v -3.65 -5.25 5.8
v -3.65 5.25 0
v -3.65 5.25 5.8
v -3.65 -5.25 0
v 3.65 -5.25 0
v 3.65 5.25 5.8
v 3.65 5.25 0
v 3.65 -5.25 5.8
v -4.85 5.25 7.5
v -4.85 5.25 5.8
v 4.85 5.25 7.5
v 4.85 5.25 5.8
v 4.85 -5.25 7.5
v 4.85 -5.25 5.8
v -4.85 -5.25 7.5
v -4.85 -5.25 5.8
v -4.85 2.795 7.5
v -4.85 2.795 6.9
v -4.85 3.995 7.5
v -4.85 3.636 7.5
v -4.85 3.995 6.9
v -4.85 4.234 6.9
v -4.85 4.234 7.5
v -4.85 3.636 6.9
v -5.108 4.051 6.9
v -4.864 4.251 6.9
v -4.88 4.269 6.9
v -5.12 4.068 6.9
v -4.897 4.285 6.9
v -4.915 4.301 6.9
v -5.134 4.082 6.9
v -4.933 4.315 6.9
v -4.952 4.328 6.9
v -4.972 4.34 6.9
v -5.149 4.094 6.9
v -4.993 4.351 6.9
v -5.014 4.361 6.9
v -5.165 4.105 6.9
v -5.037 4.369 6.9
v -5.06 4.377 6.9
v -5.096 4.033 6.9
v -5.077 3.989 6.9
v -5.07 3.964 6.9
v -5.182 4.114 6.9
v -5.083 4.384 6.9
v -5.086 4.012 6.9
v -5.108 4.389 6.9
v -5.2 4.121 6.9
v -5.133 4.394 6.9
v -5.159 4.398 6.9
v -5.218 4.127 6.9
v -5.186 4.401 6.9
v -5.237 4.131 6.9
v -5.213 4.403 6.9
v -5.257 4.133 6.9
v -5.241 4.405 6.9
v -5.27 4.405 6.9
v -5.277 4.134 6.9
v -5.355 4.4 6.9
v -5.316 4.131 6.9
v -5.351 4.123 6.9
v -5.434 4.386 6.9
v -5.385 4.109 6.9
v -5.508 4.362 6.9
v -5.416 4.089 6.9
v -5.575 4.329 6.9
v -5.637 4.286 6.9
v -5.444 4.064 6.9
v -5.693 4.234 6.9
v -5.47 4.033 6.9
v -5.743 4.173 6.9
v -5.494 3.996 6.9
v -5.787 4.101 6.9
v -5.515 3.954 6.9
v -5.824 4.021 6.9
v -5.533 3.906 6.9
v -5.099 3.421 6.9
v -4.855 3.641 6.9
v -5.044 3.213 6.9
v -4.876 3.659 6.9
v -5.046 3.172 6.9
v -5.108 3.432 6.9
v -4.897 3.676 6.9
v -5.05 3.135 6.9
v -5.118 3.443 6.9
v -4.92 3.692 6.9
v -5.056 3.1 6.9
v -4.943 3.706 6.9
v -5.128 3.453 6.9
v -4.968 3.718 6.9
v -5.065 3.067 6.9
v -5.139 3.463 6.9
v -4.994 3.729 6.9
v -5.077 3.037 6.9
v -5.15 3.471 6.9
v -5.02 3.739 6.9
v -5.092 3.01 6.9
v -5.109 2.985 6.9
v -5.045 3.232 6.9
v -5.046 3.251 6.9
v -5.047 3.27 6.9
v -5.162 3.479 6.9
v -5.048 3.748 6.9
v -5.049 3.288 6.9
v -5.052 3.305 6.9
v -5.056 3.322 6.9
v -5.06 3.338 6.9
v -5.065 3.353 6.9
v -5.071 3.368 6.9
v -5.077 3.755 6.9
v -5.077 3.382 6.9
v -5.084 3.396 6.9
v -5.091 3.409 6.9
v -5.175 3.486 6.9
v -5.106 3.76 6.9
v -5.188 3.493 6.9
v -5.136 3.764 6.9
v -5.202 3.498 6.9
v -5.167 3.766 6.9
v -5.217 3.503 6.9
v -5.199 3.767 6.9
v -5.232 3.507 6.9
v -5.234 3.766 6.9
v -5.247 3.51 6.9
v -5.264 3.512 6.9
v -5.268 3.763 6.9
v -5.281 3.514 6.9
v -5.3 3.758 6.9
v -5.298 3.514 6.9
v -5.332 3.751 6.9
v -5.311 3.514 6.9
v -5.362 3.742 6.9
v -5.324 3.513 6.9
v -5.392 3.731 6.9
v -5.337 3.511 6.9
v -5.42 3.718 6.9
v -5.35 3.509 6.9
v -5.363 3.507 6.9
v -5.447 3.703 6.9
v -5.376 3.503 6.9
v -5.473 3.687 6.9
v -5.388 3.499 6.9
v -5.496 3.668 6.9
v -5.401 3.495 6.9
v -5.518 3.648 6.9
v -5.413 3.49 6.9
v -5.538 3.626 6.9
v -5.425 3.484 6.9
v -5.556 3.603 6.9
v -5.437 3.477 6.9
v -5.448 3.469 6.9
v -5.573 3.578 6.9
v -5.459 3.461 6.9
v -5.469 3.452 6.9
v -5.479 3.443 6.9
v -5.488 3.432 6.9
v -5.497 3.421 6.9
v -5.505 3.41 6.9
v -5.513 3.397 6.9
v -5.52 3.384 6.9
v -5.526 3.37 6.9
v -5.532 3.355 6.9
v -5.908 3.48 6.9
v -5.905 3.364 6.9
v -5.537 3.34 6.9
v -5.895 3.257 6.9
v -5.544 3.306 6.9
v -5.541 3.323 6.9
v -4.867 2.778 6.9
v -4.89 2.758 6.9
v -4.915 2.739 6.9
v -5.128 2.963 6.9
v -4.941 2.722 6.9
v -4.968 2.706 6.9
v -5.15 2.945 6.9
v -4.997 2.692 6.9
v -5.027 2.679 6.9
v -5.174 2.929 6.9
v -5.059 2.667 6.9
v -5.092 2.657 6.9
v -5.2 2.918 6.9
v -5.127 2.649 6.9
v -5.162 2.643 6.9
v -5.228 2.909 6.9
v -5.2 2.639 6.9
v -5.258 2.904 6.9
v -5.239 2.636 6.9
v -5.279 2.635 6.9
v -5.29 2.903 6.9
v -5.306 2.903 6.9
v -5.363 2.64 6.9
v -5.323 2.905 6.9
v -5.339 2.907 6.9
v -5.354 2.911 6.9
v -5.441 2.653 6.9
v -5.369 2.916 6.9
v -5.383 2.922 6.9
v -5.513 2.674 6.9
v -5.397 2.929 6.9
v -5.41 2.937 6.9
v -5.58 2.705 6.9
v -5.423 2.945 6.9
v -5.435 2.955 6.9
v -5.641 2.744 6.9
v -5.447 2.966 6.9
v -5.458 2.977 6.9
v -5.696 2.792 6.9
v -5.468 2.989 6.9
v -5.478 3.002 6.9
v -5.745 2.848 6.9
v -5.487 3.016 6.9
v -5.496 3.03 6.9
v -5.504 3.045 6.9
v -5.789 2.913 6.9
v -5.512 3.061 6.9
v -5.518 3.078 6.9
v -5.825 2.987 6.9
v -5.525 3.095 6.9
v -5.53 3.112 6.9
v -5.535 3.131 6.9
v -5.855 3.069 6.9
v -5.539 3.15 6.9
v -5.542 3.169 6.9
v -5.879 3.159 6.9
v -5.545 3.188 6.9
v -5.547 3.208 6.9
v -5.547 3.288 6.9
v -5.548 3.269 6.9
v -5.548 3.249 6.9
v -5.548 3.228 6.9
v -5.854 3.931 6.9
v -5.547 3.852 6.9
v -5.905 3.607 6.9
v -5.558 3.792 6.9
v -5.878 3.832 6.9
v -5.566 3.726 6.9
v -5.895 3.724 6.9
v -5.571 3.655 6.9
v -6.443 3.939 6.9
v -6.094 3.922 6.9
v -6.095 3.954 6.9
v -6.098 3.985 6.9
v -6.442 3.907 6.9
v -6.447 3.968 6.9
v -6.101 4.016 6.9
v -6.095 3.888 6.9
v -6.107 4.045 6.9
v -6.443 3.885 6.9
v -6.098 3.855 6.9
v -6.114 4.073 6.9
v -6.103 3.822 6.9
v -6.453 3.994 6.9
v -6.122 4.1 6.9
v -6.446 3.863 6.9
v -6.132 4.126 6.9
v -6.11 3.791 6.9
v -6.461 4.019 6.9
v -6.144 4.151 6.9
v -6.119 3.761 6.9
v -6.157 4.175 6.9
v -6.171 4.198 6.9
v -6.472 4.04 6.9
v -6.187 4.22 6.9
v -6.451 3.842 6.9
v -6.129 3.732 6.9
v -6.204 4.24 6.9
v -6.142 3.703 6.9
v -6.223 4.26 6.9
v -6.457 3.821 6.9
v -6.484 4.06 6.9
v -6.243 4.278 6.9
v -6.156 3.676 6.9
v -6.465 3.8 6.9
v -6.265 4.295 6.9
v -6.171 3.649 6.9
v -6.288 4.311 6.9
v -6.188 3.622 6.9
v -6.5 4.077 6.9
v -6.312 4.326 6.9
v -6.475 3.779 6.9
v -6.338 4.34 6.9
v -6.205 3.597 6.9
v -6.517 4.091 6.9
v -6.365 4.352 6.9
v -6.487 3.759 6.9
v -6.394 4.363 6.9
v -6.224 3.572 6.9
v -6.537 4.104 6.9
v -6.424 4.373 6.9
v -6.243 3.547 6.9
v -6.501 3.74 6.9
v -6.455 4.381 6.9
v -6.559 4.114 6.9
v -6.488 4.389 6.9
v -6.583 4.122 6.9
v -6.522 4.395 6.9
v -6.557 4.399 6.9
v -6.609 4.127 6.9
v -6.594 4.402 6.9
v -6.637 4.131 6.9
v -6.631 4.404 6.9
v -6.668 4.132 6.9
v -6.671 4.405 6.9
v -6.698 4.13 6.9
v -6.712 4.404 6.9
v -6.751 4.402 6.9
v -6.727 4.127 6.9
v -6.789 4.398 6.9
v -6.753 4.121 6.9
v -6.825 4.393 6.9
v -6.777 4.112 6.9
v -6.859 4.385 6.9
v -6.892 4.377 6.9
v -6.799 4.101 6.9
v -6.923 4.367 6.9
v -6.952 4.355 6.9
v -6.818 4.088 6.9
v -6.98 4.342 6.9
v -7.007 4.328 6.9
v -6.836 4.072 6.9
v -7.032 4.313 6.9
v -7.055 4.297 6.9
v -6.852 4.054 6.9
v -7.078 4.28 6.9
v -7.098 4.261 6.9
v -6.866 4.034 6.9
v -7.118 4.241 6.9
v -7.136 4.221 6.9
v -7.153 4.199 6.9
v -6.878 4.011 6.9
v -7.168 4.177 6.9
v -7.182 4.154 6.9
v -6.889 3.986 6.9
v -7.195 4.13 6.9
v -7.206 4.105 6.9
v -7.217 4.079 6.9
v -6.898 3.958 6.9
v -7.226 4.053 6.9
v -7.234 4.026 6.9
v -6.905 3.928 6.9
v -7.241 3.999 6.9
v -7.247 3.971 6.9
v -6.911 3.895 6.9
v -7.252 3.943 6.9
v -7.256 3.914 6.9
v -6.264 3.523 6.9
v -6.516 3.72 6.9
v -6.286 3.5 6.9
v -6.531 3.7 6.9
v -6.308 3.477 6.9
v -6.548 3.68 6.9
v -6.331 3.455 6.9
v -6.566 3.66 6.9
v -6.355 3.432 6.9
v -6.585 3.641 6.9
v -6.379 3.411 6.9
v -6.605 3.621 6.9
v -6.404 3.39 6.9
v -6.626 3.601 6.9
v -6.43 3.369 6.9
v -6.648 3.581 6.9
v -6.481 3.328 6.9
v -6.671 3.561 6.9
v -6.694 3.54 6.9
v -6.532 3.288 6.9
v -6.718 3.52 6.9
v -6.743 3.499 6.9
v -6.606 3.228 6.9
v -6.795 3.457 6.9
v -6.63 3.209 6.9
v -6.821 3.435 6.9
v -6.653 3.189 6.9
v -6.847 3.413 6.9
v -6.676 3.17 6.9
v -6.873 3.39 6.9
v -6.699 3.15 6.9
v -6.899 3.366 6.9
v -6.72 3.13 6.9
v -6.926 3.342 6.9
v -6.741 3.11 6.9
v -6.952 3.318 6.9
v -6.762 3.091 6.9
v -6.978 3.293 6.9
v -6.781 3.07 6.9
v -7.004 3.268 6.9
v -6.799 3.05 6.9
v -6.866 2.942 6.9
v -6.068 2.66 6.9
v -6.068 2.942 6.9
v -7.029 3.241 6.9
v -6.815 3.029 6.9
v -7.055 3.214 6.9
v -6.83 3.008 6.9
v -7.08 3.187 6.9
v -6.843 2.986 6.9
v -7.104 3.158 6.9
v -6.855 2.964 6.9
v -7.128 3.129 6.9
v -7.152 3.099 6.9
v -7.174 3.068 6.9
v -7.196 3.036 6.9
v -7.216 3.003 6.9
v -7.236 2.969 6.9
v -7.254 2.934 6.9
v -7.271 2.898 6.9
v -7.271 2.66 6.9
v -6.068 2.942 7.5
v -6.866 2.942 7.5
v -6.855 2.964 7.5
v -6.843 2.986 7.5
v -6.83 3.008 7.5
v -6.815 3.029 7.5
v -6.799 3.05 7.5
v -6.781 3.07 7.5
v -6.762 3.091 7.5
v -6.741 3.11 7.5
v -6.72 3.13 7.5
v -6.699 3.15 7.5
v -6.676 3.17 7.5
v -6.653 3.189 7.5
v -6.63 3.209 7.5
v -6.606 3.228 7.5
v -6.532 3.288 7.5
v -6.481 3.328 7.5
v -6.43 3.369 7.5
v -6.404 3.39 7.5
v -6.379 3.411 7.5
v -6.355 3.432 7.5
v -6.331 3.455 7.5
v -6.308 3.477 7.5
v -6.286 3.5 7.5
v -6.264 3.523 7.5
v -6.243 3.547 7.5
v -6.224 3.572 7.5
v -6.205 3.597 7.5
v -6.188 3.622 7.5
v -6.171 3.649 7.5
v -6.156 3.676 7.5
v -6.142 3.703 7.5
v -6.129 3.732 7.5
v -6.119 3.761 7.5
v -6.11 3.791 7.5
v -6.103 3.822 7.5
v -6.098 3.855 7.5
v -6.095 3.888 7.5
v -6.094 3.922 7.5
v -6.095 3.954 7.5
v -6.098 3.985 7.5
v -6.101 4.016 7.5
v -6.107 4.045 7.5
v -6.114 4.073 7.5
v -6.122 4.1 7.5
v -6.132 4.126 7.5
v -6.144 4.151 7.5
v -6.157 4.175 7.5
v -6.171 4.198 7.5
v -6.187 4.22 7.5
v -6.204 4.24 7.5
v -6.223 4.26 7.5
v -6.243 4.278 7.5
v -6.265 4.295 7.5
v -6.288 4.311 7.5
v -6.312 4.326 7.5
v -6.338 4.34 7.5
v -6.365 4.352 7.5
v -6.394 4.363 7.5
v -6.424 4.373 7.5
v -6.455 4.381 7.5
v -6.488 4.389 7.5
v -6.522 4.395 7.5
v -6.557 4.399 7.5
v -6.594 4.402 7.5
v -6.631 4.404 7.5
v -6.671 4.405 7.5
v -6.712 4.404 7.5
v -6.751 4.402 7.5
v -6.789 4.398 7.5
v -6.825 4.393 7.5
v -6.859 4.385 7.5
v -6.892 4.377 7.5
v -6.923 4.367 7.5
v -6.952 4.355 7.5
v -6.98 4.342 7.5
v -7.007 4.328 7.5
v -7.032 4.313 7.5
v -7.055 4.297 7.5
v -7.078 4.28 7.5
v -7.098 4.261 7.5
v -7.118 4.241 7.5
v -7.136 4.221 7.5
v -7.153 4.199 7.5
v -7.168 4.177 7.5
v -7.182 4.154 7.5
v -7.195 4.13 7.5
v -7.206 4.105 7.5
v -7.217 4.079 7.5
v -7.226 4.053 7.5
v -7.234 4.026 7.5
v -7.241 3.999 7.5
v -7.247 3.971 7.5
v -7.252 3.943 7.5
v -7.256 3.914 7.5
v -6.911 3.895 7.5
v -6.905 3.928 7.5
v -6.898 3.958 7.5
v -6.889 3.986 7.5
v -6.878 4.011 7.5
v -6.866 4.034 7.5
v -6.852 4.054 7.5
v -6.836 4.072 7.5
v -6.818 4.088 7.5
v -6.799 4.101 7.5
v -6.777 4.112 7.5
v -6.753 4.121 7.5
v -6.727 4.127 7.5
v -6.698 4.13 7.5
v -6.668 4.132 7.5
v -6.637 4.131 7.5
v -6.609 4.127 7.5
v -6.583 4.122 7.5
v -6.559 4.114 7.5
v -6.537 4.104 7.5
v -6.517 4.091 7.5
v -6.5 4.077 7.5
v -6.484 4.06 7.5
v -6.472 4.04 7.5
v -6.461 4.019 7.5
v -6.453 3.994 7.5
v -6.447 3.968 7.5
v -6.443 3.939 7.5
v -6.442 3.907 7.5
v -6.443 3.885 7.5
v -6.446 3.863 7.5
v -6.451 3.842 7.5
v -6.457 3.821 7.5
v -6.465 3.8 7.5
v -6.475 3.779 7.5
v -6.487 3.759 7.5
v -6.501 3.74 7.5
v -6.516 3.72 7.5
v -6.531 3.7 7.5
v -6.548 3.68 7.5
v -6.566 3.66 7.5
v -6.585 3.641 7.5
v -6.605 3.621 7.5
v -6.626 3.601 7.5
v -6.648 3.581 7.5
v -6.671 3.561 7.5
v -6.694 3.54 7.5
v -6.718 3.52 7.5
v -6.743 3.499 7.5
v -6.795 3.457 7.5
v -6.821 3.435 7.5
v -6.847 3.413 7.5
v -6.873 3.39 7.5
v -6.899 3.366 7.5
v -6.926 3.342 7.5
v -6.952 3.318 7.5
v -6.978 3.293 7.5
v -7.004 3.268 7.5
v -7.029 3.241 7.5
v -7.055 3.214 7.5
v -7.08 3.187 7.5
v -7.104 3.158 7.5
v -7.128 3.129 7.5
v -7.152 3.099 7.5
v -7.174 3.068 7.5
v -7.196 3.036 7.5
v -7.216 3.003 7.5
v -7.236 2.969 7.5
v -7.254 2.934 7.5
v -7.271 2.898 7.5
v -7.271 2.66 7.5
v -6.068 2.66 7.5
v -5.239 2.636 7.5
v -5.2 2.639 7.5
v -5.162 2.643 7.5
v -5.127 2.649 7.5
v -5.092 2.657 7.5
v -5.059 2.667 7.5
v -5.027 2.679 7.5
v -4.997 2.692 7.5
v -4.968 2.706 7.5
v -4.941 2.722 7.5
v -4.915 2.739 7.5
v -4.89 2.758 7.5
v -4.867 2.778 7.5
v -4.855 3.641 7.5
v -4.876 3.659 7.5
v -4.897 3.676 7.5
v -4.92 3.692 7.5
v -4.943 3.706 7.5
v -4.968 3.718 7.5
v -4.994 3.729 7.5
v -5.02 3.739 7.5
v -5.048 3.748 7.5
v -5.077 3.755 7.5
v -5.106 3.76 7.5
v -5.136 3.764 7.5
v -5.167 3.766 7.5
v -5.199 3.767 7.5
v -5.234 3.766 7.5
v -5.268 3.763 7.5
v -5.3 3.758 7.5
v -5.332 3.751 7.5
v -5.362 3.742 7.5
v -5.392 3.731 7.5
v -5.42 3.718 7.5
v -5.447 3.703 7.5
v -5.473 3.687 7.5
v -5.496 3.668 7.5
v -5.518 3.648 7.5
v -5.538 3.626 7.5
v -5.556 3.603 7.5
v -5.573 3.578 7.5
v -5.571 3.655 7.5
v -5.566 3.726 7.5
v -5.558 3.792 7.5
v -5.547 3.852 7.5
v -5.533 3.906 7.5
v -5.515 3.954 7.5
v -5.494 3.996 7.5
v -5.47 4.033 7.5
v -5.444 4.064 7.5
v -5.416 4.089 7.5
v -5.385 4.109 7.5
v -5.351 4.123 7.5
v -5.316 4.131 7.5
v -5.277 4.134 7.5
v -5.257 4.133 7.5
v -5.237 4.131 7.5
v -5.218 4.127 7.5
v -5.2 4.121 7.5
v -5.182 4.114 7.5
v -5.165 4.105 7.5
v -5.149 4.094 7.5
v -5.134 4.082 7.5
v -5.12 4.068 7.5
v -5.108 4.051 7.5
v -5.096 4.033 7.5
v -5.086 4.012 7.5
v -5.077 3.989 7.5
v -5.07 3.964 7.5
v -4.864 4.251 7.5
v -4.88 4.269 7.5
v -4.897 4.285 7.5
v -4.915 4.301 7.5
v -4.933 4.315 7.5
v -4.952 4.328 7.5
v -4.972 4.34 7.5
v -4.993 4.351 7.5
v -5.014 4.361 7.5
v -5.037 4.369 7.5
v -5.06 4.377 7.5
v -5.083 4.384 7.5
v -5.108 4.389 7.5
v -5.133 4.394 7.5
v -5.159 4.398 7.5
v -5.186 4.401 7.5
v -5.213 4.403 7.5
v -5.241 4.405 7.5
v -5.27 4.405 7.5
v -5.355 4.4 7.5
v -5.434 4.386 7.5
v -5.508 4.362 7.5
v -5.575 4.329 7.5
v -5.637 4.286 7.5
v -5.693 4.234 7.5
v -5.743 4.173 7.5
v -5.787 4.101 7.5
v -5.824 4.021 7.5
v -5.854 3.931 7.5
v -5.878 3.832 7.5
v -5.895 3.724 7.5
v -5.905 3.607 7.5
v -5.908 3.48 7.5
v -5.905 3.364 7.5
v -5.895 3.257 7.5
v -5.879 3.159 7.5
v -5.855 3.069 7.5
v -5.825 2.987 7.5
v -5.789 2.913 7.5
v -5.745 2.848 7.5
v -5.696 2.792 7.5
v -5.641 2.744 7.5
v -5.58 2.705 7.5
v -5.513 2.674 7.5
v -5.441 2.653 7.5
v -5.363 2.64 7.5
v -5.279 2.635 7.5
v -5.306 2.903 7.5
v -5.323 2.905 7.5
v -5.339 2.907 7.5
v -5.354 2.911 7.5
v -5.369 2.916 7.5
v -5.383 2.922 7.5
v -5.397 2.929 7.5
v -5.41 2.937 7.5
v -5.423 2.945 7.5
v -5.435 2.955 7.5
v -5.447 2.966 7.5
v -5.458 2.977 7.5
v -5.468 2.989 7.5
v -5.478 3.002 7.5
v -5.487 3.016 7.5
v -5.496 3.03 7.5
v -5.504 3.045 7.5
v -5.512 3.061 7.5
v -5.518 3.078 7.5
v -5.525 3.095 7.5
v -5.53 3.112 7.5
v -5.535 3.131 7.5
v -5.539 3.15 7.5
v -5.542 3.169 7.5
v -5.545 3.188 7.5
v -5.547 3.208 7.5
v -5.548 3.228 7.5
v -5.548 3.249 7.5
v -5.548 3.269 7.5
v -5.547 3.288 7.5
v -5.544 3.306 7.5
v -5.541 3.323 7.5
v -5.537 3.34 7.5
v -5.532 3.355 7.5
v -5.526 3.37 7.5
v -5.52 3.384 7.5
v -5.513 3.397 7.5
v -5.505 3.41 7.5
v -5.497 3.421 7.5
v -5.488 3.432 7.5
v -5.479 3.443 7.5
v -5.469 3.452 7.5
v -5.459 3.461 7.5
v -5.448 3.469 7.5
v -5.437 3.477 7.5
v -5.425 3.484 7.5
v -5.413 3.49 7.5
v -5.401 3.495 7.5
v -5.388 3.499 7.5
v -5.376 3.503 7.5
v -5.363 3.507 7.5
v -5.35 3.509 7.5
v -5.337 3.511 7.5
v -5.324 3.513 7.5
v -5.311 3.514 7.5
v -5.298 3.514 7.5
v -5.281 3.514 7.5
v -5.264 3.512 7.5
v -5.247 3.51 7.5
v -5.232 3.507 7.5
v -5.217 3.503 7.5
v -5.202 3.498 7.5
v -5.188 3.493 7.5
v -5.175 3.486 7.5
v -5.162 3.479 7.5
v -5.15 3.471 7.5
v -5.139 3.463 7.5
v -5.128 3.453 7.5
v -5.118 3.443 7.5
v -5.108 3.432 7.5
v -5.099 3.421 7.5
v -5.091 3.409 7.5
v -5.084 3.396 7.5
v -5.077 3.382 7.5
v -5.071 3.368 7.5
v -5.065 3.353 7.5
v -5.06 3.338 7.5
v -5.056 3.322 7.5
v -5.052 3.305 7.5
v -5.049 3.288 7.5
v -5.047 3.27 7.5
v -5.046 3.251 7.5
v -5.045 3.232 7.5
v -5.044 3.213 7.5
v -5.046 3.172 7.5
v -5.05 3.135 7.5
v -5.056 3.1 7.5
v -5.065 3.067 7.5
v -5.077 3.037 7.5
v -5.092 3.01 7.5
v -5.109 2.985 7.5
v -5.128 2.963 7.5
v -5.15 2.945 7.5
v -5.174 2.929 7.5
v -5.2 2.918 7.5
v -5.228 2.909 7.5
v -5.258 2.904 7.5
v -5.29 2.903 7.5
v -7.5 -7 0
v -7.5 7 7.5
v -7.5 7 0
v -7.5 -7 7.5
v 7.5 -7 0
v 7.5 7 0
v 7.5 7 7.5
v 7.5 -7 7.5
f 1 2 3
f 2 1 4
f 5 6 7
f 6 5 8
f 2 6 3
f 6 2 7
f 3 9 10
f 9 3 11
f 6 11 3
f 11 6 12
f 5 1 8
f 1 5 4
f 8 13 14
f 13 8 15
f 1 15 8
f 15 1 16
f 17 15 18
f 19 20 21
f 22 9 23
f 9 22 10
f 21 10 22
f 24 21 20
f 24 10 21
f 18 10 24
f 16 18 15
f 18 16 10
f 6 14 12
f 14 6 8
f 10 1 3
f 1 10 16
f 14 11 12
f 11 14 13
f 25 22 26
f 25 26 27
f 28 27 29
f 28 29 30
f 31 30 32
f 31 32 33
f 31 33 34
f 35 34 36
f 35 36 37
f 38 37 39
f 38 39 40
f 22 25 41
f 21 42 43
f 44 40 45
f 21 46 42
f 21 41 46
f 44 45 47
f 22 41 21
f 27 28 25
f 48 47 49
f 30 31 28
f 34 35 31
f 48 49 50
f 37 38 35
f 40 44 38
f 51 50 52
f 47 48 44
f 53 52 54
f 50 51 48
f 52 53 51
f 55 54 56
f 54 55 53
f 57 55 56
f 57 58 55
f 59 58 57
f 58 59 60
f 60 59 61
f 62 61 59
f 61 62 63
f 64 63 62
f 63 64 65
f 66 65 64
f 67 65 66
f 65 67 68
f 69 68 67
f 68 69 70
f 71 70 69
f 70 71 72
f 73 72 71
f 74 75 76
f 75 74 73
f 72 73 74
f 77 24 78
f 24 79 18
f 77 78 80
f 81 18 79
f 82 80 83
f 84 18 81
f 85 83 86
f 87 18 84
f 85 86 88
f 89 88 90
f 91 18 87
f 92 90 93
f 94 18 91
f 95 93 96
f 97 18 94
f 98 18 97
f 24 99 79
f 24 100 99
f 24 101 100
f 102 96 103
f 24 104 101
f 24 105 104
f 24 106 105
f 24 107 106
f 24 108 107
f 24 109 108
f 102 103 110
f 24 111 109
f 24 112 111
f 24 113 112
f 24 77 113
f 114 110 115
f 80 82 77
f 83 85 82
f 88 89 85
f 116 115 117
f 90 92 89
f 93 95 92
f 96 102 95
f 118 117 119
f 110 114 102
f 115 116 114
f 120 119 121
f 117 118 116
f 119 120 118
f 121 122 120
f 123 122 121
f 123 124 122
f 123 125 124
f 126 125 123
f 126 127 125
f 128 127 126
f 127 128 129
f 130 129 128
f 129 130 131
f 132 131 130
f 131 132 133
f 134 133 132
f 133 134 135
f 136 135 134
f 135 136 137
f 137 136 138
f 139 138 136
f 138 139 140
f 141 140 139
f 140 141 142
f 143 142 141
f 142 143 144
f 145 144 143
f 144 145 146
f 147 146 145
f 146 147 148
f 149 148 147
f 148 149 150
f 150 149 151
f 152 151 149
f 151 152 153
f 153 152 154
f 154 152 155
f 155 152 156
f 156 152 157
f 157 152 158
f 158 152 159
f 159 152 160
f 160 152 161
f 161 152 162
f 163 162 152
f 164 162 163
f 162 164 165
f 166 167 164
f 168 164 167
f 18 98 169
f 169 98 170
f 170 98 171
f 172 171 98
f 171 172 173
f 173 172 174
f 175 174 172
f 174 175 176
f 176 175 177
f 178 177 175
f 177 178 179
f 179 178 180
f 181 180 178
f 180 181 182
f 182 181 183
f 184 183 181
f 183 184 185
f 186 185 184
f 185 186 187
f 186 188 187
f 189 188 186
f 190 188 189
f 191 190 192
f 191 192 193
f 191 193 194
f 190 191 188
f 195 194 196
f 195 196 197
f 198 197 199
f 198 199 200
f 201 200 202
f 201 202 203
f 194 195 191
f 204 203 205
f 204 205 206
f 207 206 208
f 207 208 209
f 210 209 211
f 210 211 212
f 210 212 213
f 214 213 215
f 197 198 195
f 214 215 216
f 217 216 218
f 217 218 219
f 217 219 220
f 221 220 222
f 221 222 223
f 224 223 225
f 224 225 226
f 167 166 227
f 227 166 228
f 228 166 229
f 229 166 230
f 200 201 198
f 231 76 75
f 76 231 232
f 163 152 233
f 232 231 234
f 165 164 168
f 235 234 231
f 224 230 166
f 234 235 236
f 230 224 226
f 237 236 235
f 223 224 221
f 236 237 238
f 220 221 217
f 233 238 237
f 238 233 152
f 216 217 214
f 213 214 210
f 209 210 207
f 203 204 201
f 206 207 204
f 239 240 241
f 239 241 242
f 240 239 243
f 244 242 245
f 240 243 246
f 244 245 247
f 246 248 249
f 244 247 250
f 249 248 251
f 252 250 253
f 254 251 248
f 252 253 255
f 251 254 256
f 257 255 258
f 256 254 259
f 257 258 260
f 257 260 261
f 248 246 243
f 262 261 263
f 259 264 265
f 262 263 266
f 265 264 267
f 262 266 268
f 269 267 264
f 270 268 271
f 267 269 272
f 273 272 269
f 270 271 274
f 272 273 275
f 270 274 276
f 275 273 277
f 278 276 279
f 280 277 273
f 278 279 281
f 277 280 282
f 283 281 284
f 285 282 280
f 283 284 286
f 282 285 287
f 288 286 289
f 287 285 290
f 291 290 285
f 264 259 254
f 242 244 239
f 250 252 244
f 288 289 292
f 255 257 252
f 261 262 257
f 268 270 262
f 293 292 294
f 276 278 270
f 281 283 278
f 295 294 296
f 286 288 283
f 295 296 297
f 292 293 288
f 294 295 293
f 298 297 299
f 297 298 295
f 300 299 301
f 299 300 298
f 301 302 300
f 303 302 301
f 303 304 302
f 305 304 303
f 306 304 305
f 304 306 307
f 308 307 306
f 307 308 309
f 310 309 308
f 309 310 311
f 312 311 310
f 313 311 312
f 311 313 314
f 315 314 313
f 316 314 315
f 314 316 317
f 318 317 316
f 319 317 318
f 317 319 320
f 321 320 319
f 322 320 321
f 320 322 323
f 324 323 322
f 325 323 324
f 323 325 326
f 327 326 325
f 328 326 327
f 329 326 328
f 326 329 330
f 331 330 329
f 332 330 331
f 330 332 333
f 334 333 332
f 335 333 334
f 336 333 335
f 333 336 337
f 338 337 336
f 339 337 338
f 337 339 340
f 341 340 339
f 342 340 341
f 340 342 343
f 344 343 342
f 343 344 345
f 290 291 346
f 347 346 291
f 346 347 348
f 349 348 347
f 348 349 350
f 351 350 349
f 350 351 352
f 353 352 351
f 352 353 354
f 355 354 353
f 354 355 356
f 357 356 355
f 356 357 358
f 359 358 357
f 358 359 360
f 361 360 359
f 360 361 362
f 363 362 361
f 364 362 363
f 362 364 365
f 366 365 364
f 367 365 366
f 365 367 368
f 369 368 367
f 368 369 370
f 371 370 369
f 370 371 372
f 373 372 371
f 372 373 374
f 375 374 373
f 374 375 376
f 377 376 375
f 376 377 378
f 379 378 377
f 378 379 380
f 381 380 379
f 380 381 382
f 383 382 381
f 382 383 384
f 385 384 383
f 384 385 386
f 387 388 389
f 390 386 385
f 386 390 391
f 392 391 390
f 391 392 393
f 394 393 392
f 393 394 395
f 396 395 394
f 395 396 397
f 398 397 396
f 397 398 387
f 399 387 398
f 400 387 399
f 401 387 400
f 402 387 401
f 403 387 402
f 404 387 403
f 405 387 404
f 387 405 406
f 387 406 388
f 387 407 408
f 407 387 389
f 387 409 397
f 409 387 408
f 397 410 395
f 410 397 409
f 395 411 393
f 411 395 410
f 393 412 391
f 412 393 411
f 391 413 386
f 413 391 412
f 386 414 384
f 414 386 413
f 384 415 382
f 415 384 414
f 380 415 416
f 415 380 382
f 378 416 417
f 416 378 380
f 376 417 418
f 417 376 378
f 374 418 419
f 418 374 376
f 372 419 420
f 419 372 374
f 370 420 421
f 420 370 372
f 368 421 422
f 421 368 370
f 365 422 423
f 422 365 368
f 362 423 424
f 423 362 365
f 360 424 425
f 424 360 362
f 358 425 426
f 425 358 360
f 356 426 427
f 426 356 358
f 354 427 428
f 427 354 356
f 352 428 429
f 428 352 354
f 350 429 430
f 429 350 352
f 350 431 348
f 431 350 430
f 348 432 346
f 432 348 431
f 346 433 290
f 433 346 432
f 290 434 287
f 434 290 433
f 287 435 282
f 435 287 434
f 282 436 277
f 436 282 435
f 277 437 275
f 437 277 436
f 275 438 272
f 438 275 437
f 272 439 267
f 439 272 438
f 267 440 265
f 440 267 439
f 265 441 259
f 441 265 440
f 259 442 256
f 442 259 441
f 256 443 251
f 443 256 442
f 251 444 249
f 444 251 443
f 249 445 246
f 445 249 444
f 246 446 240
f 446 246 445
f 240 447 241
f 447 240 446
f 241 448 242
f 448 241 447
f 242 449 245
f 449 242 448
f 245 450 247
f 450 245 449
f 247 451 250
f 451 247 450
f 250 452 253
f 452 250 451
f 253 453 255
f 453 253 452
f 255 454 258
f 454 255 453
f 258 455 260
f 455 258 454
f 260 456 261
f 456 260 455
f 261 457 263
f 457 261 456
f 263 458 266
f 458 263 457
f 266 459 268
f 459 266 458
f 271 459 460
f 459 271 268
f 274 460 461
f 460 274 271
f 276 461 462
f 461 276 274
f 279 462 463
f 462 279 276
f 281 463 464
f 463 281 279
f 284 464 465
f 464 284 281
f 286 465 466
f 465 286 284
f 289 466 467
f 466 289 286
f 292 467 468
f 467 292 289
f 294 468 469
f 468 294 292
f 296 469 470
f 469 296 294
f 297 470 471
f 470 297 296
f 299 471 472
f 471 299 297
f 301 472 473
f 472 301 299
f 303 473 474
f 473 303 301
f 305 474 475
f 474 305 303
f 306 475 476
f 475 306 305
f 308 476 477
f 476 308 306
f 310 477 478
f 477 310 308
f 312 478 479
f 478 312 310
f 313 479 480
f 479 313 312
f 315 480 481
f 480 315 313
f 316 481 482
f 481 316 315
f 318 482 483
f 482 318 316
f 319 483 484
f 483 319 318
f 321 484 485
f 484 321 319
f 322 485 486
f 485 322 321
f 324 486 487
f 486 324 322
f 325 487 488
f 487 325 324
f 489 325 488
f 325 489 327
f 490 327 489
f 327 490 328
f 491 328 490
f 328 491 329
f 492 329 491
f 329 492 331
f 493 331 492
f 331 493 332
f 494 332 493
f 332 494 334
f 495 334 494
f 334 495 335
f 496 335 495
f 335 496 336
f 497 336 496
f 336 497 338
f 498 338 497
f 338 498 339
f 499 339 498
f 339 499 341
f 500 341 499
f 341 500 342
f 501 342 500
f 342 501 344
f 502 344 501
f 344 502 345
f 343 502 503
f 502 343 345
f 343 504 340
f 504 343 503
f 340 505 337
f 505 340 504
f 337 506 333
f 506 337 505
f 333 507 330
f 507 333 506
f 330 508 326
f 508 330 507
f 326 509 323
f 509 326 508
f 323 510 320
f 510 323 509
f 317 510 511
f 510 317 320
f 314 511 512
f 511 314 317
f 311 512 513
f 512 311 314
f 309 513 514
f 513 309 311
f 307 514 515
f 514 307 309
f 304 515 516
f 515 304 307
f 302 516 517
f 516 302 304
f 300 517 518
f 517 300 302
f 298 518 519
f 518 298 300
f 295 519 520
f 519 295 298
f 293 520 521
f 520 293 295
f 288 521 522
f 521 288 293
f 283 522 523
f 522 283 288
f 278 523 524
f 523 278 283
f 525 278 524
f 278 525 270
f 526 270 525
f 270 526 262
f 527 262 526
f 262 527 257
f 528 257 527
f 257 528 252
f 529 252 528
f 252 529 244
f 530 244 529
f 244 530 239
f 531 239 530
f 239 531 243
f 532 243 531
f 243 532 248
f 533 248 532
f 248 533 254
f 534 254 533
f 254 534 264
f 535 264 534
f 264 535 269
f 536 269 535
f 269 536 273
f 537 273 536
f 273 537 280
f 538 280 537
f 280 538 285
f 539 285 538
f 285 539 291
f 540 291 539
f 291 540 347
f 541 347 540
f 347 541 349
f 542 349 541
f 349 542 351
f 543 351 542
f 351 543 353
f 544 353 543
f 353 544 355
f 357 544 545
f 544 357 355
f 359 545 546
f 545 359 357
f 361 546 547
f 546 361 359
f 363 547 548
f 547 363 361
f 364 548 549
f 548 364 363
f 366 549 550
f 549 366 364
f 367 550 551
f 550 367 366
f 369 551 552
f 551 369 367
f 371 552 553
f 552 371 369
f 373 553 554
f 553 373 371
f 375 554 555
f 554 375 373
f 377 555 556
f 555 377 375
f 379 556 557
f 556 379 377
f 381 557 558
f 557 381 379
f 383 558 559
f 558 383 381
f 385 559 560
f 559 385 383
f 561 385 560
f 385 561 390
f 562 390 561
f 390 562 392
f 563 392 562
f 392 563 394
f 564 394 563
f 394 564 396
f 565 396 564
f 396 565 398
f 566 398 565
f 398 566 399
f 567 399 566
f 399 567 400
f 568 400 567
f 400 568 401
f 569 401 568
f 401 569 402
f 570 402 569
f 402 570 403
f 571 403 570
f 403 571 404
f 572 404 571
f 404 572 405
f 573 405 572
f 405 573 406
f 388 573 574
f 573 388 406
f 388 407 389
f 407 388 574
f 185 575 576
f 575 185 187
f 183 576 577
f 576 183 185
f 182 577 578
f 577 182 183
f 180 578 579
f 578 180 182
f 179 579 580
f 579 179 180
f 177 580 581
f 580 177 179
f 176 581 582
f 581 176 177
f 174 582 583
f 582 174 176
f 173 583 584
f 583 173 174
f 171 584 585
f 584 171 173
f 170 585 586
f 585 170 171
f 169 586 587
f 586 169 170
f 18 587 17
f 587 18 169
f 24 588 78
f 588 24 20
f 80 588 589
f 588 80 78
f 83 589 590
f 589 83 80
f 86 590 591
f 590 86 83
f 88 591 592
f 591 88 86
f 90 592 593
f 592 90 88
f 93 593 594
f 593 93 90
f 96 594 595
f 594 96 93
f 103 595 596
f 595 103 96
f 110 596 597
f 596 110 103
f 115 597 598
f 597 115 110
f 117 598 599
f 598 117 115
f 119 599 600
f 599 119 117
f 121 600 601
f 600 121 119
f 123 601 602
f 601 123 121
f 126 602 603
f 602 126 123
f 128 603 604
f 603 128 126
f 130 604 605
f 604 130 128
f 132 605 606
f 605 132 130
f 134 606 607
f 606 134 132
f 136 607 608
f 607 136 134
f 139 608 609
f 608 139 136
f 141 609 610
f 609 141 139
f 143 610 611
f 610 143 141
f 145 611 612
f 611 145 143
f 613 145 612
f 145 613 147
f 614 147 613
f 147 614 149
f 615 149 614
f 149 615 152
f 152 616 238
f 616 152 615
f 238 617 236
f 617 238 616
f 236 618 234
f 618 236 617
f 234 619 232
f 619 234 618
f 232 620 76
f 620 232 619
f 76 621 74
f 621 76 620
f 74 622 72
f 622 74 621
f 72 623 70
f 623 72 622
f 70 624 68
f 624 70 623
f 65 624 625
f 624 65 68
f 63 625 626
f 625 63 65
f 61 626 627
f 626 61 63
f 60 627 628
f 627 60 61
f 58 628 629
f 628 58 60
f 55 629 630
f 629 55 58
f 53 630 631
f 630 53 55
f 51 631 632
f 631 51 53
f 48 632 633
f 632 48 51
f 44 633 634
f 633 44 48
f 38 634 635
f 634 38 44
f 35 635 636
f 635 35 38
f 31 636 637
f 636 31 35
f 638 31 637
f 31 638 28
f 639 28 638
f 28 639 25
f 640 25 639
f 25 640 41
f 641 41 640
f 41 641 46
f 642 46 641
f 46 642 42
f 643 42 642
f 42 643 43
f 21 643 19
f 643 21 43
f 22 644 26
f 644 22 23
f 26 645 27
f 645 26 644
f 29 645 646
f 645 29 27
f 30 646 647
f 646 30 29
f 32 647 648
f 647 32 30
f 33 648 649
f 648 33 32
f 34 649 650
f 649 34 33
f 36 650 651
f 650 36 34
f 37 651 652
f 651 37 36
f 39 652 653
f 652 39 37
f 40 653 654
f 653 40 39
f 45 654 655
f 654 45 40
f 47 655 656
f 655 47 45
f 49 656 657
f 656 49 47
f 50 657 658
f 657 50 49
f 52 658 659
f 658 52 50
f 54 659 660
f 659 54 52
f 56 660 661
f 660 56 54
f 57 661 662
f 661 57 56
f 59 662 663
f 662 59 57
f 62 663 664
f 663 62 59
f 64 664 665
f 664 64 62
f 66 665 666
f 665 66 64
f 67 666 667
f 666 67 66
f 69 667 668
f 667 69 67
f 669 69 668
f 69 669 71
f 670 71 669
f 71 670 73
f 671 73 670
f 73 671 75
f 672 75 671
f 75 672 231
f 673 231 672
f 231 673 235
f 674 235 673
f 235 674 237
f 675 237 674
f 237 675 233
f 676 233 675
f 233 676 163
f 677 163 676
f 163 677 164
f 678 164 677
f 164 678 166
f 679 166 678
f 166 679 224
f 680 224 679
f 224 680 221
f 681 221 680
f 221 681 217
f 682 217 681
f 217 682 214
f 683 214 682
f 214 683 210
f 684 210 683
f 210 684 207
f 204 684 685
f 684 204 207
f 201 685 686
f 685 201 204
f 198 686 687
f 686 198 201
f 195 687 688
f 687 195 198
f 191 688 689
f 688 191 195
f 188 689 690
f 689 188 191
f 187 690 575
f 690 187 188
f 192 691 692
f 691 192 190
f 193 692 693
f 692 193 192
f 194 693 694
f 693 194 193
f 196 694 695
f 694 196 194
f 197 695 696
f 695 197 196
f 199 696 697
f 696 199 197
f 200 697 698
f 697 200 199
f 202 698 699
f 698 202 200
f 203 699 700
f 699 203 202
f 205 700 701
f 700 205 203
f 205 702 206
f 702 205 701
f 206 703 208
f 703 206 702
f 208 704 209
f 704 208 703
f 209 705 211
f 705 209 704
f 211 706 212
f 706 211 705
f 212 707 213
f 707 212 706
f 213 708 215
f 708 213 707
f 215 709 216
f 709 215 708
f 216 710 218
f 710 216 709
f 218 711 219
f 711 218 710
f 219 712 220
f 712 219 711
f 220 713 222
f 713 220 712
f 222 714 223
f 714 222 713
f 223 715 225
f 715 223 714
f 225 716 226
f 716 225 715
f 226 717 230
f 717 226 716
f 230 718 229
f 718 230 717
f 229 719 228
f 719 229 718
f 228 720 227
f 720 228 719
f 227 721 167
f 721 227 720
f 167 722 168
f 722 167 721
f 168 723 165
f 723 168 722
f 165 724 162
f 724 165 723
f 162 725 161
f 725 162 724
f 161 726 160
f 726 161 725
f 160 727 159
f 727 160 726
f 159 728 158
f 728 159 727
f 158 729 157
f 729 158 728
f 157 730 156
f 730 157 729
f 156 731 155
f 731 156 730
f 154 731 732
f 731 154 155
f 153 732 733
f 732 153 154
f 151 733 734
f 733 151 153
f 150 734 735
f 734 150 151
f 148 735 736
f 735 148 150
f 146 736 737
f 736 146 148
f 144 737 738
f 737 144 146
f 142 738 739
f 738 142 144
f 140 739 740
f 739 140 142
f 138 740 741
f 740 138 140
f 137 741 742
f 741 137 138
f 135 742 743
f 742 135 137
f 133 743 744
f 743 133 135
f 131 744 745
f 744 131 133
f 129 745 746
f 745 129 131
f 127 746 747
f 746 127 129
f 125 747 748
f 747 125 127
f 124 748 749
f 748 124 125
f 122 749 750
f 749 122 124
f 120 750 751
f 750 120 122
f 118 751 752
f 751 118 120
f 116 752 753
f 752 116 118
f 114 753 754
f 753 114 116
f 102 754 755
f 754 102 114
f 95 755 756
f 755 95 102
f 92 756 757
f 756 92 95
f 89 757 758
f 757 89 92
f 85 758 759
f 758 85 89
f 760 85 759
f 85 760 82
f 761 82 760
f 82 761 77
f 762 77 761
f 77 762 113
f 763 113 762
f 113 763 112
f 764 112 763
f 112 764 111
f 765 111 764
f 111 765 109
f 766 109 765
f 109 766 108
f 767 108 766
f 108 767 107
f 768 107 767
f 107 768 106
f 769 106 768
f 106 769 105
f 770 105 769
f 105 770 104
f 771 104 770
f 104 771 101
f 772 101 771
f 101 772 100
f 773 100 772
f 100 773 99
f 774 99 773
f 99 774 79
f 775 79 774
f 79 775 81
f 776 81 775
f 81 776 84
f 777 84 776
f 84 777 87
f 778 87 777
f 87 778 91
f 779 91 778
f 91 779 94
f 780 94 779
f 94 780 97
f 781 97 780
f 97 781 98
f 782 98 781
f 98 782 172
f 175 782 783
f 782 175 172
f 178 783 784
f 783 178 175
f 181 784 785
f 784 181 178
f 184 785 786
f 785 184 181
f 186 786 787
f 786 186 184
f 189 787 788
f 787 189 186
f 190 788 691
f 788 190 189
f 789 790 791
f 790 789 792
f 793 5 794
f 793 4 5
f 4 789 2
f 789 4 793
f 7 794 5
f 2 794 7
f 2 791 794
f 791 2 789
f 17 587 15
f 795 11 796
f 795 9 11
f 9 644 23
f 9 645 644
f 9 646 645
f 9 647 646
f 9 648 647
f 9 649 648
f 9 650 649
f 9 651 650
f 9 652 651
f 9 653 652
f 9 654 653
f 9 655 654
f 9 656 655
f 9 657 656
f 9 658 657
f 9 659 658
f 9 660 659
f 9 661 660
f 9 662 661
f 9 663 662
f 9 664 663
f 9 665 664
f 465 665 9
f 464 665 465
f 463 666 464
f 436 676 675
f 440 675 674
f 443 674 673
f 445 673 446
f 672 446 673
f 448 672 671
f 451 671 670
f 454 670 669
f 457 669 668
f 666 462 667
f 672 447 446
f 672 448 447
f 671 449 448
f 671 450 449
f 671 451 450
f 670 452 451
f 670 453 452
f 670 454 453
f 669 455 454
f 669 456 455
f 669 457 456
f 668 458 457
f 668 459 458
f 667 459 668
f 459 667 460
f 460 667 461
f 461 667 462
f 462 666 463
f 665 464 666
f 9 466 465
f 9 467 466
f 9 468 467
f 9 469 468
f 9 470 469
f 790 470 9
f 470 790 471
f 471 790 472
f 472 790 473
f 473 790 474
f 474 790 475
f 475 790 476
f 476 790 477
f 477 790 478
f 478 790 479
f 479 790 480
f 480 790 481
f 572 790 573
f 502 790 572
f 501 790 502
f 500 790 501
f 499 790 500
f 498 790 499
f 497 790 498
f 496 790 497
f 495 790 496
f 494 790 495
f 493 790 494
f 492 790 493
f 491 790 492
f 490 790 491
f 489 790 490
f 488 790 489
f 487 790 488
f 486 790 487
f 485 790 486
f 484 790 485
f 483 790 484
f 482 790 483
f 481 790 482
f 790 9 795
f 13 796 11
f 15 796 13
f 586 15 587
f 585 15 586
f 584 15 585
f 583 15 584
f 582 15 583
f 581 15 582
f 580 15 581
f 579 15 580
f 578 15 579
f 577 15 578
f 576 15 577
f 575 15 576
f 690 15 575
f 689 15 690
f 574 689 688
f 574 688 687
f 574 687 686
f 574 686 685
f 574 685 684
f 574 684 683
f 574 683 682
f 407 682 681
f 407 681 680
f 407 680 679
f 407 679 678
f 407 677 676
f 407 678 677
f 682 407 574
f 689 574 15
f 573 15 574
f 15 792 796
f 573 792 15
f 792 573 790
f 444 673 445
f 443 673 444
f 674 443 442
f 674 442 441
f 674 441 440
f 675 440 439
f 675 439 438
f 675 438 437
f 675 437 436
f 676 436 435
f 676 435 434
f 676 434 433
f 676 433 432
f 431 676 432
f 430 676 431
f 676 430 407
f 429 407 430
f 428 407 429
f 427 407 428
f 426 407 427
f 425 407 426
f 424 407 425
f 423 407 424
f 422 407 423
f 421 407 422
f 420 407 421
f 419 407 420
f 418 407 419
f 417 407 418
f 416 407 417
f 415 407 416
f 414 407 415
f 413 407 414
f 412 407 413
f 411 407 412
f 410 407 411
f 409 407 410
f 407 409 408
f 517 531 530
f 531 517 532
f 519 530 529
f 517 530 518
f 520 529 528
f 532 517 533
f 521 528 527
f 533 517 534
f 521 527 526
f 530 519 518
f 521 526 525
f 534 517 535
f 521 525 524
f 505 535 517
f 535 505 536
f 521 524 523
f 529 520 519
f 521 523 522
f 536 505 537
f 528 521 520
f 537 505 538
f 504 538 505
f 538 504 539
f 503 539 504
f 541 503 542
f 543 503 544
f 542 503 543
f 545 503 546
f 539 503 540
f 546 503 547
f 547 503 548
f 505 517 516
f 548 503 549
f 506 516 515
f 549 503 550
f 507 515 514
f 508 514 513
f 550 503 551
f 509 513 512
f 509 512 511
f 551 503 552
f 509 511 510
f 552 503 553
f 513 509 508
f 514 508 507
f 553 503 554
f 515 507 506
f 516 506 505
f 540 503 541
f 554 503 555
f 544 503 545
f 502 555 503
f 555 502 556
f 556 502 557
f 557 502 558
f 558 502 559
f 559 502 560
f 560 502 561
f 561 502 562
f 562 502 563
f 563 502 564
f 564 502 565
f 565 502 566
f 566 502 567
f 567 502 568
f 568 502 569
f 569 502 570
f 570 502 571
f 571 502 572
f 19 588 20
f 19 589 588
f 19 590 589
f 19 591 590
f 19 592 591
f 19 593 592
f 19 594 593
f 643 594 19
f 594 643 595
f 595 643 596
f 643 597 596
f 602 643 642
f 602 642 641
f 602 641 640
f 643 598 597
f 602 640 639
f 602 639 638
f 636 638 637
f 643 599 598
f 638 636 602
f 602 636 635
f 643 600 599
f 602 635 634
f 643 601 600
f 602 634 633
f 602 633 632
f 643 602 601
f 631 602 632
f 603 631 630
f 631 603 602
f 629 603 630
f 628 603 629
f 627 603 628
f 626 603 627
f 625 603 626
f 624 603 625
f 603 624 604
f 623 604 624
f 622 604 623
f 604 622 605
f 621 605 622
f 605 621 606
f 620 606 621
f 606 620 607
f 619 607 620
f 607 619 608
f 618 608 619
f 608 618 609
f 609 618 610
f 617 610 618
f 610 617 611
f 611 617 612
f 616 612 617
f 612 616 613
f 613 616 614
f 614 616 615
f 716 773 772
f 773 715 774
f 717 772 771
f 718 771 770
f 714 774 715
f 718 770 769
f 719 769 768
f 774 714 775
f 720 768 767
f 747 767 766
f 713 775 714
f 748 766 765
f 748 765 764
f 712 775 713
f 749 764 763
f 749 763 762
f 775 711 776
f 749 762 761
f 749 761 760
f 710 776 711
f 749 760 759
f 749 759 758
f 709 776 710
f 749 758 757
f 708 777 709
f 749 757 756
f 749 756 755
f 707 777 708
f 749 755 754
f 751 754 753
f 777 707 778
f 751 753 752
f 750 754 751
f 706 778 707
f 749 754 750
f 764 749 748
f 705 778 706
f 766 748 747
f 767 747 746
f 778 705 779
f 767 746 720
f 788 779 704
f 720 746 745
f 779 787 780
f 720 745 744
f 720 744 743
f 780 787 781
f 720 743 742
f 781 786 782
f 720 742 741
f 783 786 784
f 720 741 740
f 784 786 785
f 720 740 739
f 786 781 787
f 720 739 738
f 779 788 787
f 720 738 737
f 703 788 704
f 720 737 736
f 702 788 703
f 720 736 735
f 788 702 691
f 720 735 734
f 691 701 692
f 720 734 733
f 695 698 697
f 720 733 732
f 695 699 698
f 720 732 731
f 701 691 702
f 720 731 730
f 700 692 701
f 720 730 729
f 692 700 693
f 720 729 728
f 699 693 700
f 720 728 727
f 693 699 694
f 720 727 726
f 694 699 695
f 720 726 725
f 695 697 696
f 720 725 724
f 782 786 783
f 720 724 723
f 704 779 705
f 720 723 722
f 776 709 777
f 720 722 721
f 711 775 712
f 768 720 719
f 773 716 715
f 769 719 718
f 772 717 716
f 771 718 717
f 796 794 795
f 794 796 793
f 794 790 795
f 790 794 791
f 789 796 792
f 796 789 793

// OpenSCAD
$fn = 50;

difference() {
	union() {
		translate(v = [0, -5, 7.5]) {
			rotate(a = [0, 180, 0]) {
				difference() {
					union() {
						translate(v = [-7.5, -2.0, 0]) {
							cube(size = [15.0, 14.0, 7.5]);
						}
					}
					union() {
						translate(v = [-3.65, -0.25, -0.1]) {
							cube(size = [7.3, 10.5, 7.7]);
						}
						translate(v = [-4.85, -0.25, -0.1]) {
							cube(size = [9.7, 10.5, 1.8]);
						}
						translate(v = [6, 8.5, 0.6]) {
							rotate(a = [0, 180, 0]) {
								linear_extrude(height = 0.7) {
									text(font = "Arial:style=Bold", halign = "center", size = 1.8, text = "26", valign = "center");
								}
							}
						}
					}
				}
			}
		}
	}
	union();
}
